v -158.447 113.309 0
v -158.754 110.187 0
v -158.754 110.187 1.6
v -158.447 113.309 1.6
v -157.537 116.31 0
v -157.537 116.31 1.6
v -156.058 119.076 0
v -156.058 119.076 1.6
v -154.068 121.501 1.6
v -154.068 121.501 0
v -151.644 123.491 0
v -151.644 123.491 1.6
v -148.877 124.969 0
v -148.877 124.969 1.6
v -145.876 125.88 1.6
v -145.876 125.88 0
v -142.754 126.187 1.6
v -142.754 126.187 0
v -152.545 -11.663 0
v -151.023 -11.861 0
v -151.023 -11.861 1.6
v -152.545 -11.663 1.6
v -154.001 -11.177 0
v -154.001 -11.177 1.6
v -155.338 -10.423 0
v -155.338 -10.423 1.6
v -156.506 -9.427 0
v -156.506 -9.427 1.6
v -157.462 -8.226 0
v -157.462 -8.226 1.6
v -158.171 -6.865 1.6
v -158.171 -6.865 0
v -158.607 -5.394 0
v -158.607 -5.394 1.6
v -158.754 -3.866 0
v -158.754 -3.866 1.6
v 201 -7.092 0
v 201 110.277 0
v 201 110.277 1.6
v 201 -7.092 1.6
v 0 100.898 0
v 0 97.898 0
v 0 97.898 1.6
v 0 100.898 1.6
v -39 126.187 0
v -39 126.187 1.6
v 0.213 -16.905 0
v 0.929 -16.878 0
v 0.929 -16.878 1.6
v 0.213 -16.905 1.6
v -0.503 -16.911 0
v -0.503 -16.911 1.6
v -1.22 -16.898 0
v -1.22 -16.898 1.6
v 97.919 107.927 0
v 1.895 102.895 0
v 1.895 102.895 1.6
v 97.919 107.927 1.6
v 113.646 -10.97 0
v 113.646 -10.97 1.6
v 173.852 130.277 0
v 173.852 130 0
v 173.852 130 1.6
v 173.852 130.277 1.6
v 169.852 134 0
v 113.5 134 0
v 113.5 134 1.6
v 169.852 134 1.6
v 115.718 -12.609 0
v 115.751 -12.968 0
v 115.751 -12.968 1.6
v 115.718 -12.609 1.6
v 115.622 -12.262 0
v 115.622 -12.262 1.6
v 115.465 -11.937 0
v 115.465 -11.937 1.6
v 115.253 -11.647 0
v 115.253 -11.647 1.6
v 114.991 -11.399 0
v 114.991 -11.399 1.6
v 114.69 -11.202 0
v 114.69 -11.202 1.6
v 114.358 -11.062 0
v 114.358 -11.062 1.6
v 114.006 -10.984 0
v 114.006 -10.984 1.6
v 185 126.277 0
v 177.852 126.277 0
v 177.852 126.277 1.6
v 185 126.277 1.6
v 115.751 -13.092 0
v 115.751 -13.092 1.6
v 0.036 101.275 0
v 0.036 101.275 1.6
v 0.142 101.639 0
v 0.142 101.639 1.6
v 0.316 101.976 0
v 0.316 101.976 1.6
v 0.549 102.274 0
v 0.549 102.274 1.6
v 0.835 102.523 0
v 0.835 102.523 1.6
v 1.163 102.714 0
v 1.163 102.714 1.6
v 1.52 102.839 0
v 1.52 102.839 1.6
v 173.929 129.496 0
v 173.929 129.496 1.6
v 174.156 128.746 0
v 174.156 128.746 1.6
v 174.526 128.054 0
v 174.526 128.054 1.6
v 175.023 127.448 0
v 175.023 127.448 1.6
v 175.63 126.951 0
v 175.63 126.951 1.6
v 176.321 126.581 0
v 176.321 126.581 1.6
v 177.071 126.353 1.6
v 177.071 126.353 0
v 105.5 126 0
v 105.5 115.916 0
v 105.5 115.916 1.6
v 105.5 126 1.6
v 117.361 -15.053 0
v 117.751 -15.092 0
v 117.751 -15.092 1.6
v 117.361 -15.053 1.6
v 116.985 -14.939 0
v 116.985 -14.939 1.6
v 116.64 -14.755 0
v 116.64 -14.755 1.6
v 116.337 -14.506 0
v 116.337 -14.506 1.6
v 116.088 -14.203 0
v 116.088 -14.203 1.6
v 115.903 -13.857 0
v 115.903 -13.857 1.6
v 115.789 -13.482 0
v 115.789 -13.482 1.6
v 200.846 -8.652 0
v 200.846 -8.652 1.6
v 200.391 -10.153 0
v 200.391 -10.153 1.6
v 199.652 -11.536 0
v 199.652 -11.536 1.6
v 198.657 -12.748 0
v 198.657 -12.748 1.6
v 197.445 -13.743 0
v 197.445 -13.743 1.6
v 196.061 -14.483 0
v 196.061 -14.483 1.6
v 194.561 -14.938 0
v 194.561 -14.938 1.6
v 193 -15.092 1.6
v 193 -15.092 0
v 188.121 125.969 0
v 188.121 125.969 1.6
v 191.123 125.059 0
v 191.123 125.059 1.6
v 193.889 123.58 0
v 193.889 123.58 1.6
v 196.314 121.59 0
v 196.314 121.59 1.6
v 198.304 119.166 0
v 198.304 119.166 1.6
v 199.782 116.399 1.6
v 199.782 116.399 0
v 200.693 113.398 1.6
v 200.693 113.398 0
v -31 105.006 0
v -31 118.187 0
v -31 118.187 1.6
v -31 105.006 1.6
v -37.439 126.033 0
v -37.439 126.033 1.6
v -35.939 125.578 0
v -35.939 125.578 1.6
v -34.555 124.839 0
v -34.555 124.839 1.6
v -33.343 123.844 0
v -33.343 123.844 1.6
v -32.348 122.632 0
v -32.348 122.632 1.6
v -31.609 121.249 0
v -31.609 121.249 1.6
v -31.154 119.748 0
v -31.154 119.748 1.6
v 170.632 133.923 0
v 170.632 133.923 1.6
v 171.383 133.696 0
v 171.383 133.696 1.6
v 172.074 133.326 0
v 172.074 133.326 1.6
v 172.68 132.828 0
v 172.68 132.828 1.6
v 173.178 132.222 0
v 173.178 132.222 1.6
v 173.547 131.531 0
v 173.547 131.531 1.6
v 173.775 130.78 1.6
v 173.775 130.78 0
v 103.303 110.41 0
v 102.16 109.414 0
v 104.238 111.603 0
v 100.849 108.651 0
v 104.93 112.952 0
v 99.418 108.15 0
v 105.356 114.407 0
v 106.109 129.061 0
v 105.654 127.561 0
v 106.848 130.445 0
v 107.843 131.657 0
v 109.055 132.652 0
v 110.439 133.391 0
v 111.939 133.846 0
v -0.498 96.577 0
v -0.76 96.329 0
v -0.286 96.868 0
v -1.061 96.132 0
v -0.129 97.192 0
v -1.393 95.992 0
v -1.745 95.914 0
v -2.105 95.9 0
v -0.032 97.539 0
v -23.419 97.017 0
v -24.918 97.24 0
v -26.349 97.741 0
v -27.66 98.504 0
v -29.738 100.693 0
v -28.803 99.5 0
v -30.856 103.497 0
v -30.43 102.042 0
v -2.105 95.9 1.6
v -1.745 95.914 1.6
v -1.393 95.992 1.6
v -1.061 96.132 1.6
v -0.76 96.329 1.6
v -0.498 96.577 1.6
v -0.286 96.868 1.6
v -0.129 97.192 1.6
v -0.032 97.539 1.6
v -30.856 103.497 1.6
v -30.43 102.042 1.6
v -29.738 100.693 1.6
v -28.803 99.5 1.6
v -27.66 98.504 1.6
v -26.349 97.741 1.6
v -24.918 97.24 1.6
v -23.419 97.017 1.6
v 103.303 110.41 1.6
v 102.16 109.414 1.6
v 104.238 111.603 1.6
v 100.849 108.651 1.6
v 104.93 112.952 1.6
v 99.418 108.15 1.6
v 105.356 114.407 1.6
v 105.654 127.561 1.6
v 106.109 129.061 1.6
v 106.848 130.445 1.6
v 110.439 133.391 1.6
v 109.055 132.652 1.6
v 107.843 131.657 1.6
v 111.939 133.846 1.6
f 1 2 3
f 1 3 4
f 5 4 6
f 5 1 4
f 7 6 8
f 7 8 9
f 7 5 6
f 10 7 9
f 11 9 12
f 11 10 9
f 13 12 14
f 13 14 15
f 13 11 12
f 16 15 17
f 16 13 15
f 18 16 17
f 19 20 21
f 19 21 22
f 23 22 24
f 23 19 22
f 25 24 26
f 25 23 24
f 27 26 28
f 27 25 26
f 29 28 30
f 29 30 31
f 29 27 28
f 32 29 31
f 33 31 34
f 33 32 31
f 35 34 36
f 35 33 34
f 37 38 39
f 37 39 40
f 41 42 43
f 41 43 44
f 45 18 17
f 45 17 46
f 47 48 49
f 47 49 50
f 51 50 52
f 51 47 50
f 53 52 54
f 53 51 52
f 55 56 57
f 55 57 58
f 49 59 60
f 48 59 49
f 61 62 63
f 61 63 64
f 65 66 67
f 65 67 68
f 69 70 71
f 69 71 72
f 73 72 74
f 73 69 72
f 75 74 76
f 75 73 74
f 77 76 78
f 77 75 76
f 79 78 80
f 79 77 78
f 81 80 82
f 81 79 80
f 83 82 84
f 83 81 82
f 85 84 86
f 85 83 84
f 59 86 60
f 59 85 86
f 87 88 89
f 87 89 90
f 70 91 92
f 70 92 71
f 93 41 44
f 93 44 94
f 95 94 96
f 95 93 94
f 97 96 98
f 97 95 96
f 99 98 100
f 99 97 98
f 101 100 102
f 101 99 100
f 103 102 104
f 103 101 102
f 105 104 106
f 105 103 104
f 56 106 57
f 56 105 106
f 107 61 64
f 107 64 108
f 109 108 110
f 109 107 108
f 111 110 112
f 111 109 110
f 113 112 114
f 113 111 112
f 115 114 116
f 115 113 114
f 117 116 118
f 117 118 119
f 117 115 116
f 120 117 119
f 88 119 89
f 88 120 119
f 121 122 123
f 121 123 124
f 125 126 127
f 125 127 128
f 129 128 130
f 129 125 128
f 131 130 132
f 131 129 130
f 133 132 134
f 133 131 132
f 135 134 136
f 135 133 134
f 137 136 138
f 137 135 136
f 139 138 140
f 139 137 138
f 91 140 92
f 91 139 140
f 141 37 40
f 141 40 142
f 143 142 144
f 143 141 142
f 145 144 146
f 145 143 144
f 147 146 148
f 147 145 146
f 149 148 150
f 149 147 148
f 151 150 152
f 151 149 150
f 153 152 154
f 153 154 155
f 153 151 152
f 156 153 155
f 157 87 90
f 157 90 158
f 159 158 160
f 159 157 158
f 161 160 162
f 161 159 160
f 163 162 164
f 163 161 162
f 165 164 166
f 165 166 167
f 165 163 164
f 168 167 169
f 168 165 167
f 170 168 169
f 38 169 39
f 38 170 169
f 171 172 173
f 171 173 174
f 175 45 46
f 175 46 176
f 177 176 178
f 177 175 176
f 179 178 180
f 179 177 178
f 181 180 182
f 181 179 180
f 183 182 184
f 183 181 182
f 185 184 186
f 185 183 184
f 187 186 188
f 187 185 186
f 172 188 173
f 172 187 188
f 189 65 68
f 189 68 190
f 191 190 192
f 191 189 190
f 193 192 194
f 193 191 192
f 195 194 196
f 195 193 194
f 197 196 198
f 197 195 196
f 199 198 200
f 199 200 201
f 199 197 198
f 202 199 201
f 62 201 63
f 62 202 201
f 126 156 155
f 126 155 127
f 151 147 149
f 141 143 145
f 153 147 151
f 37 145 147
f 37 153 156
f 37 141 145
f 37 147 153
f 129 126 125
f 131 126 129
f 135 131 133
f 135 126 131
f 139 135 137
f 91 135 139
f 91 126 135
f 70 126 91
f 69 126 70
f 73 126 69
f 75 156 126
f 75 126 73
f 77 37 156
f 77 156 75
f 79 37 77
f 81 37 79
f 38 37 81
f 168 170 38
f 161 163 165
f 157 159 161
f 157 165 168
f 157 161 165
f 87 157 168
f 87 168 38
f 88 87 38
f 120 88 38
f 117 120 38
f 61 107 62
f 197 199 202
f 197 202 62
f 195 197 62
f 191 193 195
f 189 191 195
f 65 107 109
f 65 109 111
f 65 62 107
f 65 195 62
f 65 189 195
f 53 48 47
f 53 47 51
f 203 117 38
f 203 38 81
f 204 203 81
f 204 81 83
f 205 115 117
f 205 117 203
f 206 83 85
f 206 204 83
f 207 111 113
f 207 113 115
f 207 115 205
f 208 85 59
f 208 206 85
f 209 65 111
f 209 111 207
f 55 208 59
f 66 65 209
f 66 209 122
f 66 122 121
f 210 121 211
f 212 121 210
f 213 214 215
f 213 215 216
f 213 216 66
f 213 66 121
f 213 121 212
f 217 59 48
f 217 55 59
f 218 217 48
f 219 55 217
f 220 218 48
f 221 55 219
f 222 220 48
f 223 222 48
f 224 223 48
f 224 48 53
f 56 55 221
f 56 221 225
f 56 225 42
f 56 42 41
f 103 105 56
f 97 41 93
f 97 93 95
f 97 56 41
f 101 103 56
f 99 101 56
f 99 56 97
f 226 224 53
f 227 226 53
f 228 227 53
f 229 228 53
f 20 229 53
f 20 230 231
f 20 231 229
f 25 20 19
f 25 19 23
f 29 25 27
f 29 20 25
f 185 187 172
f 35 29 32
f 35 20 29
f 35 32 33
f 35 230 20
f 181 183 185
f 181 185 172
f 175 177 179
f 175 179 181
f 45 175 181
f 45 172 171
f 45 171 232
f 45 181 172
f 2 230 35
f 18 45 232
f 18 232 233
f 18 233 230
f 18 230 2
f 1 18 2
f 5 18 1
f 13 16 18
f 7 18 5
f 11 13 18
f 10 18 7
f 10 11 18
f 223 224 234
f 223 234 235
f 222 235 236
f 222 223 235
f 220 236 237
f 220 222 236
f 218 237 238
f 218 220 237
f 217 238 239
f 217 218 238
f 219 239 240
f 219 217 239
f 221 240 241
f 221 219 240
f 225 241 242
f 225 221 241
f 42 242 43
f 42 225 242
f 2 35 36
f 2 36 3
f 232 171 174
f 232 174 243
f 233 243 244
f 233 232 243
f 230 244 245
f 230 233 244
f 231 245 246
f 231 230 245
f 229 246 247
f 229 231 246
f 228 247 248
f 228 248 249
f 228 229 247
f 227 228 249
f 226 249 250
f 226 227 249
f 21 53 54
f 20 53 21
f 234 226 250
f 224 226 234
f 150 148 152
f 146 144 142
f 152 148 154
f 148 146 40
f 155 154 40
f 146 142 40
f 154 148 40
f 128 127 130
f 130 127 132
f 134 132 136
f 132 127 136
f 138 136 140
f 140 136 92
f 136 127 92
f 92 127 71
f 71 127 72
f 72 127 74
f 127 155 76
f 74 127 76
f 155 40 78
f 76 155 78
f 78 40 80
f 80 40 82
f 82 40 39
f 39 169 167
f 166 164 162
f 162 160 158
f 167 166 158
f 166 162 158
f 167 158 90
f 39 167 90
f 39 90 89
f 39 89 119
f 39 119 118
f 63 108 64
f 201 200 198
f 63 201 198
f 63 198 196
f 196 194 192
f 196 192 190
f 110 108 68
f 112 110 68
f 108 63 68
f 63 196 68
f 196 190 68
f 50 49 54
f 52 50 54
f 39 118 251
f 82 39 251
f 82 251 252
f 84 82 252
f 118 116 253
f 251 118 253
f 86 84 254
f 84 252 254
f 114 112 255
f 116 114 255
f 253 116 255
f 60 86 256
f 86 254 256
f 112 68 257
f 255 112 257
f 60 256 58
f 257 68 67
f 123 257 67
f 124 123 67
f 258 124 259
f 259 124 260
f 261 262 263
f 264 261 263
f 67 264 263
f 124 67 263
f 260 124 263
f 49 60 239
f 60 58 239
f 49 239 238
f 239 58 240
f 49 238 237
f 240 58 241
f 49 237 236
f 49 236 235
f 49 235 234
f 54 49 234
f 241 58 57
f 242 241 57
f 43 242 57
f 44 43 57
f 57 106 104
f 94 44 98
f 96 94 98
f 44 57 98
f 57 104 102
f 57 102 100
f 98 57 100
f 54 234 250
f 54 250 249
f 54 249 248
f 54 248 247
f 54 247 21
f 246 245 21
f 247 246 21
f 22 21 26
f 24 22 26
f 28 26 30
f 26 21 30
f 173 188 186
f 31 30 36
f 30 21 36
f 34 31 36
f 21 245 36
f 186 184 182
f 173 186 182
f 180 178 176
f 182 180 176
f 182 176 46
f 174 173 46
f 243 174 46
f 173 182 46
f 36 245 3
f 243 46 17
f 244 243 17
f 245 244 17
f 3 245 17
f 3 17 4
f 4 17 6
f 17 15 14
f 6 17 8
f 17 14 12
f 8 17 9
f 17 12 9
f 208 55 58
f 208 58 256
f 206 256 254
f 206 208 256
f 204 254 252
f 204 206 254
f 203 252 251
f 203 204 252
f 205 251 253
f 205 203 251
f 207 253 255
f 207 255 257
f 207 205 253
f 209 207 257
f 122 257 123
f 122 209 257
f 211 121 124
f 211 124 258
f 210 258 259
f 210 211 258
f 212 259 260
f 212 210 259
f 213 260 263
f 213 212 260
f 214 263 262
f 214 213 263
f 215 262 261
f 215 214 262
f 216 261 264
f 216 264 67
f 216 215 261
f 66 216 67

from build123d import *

# Parameters (mm, degrees)
ESTRUSIONE_ESTRUSIONE2_DEPTH = 1.6


with BuildPart() as part:
    # bordo2 → Estrusione-Estrusione2 (new body)
    with BuildSketch(Plane.XY):
        with BuildLine():
            Line((201, 97.893856635), (201, -7.091597346))
            ThreePointArc((201, -7.091597346), (198.656854249, -12.748451596), (193, -15.091597346))
            Line((193, -15.091597346), (117.750790543, -15.091597346))
            ThreePointArc((117.750790543, -15.091597346), (116.336576981, -14.505810909), (115.750790543, -13.091597346))
            Line((115.750790543, -13.091597346), (115.750790543, -12.967534141))
            ThreePointArc((115.750790543, -12.967534141), (115.127499694, -11.516785399), (113.64611863, -10.970275071))
            Line((113.64611863, -10.970275071), (0.928841556, -16.877537249))
            ThreePointArc((0.928841556, -16.877537249), (-0.145141858, -16.910699844), (-1.219558299, -16.897682863))
            Line((-1.219558299, -16.897682863), (-151.023233988, -11.861429997))
            ThreePointArc((-151.023233988, -11.861429997), (-156.505538032, -9.426954116), (-158.754433684, -3.865947122))
            Line((-158.754433684, -3.865947122), (-158.754433684, 95.67986032))
            Line((-158.754433684, 95.67986032), (-158.754433684, 110.187089821))
            ThreePointArc((-158.754433684, 110.187089821), (-154.068142183, 121.50079832), (-142.754433684, 126.187089821))
            Line((-142.754433684, 126.187089821), (-39, 126.187089821))
            ThreePointArc((-39, 126.187089821), (-33.343145751, 123.843944071), (-31, 118.187089821))
            Line((-31, 118.187089821), (-31, 105.006491693))
            ThreePointArc((-31, 105.006491693), (-28.802994968, 99.499655087), (-23.41868765, 97.017455415))
            Line((-23.41868765, 97.017455415), (-2.104671912, 95.900435182))
            ThreePointArc((-2.104671912, 95.900435182), (-0.623290849, 96.44694551), (0, 97.897694252))
            Line((0, 97.897694252), (0, 100.897694252))
            ThreePointArc((0, 100.897694252), (0.549251258, 102.274403403), (1.895328088, 102.894953321))
            Line((1.895328088, 102.894953321), (97.91868765, 107.927324355))
            ThreePointArc((97.91868765, 107.927324355), (103.302994968, 110.409524028), (105.5, 115.916360633))
            Line((105.5, 115.916360633), (105.5, 126))
            ThreePointArc((105.5, 126), (107.843145751, 131.656854249), (113.5, 134))
            Line((113.5, 134), (169.851790543, 134))
            ThreePointArc((169.851790543, 134), (172.680217668, 132.828427125), (173.851790543, 130))
            Line((173.851790543, 130), (173.851790543, 130.276535982))
            ThreePointArc((173.851790543, 130.276535982), (175.023363418, 127.448108857), (177.851790543, 126.276535982))
            Line((177.851790543, 126.276535982), (185, 126.276535982))
            ThreePointArc((185, 126.276535982), (196.313708499, 121.590244481), (201, 110.276535982))
            Line((201, 110.276535982), (201, 97.893856635))
        make_face()
    extrude(amount=ESTRUSIONE_ESTRUSIONE2_DEPTH)


solid = part.part
